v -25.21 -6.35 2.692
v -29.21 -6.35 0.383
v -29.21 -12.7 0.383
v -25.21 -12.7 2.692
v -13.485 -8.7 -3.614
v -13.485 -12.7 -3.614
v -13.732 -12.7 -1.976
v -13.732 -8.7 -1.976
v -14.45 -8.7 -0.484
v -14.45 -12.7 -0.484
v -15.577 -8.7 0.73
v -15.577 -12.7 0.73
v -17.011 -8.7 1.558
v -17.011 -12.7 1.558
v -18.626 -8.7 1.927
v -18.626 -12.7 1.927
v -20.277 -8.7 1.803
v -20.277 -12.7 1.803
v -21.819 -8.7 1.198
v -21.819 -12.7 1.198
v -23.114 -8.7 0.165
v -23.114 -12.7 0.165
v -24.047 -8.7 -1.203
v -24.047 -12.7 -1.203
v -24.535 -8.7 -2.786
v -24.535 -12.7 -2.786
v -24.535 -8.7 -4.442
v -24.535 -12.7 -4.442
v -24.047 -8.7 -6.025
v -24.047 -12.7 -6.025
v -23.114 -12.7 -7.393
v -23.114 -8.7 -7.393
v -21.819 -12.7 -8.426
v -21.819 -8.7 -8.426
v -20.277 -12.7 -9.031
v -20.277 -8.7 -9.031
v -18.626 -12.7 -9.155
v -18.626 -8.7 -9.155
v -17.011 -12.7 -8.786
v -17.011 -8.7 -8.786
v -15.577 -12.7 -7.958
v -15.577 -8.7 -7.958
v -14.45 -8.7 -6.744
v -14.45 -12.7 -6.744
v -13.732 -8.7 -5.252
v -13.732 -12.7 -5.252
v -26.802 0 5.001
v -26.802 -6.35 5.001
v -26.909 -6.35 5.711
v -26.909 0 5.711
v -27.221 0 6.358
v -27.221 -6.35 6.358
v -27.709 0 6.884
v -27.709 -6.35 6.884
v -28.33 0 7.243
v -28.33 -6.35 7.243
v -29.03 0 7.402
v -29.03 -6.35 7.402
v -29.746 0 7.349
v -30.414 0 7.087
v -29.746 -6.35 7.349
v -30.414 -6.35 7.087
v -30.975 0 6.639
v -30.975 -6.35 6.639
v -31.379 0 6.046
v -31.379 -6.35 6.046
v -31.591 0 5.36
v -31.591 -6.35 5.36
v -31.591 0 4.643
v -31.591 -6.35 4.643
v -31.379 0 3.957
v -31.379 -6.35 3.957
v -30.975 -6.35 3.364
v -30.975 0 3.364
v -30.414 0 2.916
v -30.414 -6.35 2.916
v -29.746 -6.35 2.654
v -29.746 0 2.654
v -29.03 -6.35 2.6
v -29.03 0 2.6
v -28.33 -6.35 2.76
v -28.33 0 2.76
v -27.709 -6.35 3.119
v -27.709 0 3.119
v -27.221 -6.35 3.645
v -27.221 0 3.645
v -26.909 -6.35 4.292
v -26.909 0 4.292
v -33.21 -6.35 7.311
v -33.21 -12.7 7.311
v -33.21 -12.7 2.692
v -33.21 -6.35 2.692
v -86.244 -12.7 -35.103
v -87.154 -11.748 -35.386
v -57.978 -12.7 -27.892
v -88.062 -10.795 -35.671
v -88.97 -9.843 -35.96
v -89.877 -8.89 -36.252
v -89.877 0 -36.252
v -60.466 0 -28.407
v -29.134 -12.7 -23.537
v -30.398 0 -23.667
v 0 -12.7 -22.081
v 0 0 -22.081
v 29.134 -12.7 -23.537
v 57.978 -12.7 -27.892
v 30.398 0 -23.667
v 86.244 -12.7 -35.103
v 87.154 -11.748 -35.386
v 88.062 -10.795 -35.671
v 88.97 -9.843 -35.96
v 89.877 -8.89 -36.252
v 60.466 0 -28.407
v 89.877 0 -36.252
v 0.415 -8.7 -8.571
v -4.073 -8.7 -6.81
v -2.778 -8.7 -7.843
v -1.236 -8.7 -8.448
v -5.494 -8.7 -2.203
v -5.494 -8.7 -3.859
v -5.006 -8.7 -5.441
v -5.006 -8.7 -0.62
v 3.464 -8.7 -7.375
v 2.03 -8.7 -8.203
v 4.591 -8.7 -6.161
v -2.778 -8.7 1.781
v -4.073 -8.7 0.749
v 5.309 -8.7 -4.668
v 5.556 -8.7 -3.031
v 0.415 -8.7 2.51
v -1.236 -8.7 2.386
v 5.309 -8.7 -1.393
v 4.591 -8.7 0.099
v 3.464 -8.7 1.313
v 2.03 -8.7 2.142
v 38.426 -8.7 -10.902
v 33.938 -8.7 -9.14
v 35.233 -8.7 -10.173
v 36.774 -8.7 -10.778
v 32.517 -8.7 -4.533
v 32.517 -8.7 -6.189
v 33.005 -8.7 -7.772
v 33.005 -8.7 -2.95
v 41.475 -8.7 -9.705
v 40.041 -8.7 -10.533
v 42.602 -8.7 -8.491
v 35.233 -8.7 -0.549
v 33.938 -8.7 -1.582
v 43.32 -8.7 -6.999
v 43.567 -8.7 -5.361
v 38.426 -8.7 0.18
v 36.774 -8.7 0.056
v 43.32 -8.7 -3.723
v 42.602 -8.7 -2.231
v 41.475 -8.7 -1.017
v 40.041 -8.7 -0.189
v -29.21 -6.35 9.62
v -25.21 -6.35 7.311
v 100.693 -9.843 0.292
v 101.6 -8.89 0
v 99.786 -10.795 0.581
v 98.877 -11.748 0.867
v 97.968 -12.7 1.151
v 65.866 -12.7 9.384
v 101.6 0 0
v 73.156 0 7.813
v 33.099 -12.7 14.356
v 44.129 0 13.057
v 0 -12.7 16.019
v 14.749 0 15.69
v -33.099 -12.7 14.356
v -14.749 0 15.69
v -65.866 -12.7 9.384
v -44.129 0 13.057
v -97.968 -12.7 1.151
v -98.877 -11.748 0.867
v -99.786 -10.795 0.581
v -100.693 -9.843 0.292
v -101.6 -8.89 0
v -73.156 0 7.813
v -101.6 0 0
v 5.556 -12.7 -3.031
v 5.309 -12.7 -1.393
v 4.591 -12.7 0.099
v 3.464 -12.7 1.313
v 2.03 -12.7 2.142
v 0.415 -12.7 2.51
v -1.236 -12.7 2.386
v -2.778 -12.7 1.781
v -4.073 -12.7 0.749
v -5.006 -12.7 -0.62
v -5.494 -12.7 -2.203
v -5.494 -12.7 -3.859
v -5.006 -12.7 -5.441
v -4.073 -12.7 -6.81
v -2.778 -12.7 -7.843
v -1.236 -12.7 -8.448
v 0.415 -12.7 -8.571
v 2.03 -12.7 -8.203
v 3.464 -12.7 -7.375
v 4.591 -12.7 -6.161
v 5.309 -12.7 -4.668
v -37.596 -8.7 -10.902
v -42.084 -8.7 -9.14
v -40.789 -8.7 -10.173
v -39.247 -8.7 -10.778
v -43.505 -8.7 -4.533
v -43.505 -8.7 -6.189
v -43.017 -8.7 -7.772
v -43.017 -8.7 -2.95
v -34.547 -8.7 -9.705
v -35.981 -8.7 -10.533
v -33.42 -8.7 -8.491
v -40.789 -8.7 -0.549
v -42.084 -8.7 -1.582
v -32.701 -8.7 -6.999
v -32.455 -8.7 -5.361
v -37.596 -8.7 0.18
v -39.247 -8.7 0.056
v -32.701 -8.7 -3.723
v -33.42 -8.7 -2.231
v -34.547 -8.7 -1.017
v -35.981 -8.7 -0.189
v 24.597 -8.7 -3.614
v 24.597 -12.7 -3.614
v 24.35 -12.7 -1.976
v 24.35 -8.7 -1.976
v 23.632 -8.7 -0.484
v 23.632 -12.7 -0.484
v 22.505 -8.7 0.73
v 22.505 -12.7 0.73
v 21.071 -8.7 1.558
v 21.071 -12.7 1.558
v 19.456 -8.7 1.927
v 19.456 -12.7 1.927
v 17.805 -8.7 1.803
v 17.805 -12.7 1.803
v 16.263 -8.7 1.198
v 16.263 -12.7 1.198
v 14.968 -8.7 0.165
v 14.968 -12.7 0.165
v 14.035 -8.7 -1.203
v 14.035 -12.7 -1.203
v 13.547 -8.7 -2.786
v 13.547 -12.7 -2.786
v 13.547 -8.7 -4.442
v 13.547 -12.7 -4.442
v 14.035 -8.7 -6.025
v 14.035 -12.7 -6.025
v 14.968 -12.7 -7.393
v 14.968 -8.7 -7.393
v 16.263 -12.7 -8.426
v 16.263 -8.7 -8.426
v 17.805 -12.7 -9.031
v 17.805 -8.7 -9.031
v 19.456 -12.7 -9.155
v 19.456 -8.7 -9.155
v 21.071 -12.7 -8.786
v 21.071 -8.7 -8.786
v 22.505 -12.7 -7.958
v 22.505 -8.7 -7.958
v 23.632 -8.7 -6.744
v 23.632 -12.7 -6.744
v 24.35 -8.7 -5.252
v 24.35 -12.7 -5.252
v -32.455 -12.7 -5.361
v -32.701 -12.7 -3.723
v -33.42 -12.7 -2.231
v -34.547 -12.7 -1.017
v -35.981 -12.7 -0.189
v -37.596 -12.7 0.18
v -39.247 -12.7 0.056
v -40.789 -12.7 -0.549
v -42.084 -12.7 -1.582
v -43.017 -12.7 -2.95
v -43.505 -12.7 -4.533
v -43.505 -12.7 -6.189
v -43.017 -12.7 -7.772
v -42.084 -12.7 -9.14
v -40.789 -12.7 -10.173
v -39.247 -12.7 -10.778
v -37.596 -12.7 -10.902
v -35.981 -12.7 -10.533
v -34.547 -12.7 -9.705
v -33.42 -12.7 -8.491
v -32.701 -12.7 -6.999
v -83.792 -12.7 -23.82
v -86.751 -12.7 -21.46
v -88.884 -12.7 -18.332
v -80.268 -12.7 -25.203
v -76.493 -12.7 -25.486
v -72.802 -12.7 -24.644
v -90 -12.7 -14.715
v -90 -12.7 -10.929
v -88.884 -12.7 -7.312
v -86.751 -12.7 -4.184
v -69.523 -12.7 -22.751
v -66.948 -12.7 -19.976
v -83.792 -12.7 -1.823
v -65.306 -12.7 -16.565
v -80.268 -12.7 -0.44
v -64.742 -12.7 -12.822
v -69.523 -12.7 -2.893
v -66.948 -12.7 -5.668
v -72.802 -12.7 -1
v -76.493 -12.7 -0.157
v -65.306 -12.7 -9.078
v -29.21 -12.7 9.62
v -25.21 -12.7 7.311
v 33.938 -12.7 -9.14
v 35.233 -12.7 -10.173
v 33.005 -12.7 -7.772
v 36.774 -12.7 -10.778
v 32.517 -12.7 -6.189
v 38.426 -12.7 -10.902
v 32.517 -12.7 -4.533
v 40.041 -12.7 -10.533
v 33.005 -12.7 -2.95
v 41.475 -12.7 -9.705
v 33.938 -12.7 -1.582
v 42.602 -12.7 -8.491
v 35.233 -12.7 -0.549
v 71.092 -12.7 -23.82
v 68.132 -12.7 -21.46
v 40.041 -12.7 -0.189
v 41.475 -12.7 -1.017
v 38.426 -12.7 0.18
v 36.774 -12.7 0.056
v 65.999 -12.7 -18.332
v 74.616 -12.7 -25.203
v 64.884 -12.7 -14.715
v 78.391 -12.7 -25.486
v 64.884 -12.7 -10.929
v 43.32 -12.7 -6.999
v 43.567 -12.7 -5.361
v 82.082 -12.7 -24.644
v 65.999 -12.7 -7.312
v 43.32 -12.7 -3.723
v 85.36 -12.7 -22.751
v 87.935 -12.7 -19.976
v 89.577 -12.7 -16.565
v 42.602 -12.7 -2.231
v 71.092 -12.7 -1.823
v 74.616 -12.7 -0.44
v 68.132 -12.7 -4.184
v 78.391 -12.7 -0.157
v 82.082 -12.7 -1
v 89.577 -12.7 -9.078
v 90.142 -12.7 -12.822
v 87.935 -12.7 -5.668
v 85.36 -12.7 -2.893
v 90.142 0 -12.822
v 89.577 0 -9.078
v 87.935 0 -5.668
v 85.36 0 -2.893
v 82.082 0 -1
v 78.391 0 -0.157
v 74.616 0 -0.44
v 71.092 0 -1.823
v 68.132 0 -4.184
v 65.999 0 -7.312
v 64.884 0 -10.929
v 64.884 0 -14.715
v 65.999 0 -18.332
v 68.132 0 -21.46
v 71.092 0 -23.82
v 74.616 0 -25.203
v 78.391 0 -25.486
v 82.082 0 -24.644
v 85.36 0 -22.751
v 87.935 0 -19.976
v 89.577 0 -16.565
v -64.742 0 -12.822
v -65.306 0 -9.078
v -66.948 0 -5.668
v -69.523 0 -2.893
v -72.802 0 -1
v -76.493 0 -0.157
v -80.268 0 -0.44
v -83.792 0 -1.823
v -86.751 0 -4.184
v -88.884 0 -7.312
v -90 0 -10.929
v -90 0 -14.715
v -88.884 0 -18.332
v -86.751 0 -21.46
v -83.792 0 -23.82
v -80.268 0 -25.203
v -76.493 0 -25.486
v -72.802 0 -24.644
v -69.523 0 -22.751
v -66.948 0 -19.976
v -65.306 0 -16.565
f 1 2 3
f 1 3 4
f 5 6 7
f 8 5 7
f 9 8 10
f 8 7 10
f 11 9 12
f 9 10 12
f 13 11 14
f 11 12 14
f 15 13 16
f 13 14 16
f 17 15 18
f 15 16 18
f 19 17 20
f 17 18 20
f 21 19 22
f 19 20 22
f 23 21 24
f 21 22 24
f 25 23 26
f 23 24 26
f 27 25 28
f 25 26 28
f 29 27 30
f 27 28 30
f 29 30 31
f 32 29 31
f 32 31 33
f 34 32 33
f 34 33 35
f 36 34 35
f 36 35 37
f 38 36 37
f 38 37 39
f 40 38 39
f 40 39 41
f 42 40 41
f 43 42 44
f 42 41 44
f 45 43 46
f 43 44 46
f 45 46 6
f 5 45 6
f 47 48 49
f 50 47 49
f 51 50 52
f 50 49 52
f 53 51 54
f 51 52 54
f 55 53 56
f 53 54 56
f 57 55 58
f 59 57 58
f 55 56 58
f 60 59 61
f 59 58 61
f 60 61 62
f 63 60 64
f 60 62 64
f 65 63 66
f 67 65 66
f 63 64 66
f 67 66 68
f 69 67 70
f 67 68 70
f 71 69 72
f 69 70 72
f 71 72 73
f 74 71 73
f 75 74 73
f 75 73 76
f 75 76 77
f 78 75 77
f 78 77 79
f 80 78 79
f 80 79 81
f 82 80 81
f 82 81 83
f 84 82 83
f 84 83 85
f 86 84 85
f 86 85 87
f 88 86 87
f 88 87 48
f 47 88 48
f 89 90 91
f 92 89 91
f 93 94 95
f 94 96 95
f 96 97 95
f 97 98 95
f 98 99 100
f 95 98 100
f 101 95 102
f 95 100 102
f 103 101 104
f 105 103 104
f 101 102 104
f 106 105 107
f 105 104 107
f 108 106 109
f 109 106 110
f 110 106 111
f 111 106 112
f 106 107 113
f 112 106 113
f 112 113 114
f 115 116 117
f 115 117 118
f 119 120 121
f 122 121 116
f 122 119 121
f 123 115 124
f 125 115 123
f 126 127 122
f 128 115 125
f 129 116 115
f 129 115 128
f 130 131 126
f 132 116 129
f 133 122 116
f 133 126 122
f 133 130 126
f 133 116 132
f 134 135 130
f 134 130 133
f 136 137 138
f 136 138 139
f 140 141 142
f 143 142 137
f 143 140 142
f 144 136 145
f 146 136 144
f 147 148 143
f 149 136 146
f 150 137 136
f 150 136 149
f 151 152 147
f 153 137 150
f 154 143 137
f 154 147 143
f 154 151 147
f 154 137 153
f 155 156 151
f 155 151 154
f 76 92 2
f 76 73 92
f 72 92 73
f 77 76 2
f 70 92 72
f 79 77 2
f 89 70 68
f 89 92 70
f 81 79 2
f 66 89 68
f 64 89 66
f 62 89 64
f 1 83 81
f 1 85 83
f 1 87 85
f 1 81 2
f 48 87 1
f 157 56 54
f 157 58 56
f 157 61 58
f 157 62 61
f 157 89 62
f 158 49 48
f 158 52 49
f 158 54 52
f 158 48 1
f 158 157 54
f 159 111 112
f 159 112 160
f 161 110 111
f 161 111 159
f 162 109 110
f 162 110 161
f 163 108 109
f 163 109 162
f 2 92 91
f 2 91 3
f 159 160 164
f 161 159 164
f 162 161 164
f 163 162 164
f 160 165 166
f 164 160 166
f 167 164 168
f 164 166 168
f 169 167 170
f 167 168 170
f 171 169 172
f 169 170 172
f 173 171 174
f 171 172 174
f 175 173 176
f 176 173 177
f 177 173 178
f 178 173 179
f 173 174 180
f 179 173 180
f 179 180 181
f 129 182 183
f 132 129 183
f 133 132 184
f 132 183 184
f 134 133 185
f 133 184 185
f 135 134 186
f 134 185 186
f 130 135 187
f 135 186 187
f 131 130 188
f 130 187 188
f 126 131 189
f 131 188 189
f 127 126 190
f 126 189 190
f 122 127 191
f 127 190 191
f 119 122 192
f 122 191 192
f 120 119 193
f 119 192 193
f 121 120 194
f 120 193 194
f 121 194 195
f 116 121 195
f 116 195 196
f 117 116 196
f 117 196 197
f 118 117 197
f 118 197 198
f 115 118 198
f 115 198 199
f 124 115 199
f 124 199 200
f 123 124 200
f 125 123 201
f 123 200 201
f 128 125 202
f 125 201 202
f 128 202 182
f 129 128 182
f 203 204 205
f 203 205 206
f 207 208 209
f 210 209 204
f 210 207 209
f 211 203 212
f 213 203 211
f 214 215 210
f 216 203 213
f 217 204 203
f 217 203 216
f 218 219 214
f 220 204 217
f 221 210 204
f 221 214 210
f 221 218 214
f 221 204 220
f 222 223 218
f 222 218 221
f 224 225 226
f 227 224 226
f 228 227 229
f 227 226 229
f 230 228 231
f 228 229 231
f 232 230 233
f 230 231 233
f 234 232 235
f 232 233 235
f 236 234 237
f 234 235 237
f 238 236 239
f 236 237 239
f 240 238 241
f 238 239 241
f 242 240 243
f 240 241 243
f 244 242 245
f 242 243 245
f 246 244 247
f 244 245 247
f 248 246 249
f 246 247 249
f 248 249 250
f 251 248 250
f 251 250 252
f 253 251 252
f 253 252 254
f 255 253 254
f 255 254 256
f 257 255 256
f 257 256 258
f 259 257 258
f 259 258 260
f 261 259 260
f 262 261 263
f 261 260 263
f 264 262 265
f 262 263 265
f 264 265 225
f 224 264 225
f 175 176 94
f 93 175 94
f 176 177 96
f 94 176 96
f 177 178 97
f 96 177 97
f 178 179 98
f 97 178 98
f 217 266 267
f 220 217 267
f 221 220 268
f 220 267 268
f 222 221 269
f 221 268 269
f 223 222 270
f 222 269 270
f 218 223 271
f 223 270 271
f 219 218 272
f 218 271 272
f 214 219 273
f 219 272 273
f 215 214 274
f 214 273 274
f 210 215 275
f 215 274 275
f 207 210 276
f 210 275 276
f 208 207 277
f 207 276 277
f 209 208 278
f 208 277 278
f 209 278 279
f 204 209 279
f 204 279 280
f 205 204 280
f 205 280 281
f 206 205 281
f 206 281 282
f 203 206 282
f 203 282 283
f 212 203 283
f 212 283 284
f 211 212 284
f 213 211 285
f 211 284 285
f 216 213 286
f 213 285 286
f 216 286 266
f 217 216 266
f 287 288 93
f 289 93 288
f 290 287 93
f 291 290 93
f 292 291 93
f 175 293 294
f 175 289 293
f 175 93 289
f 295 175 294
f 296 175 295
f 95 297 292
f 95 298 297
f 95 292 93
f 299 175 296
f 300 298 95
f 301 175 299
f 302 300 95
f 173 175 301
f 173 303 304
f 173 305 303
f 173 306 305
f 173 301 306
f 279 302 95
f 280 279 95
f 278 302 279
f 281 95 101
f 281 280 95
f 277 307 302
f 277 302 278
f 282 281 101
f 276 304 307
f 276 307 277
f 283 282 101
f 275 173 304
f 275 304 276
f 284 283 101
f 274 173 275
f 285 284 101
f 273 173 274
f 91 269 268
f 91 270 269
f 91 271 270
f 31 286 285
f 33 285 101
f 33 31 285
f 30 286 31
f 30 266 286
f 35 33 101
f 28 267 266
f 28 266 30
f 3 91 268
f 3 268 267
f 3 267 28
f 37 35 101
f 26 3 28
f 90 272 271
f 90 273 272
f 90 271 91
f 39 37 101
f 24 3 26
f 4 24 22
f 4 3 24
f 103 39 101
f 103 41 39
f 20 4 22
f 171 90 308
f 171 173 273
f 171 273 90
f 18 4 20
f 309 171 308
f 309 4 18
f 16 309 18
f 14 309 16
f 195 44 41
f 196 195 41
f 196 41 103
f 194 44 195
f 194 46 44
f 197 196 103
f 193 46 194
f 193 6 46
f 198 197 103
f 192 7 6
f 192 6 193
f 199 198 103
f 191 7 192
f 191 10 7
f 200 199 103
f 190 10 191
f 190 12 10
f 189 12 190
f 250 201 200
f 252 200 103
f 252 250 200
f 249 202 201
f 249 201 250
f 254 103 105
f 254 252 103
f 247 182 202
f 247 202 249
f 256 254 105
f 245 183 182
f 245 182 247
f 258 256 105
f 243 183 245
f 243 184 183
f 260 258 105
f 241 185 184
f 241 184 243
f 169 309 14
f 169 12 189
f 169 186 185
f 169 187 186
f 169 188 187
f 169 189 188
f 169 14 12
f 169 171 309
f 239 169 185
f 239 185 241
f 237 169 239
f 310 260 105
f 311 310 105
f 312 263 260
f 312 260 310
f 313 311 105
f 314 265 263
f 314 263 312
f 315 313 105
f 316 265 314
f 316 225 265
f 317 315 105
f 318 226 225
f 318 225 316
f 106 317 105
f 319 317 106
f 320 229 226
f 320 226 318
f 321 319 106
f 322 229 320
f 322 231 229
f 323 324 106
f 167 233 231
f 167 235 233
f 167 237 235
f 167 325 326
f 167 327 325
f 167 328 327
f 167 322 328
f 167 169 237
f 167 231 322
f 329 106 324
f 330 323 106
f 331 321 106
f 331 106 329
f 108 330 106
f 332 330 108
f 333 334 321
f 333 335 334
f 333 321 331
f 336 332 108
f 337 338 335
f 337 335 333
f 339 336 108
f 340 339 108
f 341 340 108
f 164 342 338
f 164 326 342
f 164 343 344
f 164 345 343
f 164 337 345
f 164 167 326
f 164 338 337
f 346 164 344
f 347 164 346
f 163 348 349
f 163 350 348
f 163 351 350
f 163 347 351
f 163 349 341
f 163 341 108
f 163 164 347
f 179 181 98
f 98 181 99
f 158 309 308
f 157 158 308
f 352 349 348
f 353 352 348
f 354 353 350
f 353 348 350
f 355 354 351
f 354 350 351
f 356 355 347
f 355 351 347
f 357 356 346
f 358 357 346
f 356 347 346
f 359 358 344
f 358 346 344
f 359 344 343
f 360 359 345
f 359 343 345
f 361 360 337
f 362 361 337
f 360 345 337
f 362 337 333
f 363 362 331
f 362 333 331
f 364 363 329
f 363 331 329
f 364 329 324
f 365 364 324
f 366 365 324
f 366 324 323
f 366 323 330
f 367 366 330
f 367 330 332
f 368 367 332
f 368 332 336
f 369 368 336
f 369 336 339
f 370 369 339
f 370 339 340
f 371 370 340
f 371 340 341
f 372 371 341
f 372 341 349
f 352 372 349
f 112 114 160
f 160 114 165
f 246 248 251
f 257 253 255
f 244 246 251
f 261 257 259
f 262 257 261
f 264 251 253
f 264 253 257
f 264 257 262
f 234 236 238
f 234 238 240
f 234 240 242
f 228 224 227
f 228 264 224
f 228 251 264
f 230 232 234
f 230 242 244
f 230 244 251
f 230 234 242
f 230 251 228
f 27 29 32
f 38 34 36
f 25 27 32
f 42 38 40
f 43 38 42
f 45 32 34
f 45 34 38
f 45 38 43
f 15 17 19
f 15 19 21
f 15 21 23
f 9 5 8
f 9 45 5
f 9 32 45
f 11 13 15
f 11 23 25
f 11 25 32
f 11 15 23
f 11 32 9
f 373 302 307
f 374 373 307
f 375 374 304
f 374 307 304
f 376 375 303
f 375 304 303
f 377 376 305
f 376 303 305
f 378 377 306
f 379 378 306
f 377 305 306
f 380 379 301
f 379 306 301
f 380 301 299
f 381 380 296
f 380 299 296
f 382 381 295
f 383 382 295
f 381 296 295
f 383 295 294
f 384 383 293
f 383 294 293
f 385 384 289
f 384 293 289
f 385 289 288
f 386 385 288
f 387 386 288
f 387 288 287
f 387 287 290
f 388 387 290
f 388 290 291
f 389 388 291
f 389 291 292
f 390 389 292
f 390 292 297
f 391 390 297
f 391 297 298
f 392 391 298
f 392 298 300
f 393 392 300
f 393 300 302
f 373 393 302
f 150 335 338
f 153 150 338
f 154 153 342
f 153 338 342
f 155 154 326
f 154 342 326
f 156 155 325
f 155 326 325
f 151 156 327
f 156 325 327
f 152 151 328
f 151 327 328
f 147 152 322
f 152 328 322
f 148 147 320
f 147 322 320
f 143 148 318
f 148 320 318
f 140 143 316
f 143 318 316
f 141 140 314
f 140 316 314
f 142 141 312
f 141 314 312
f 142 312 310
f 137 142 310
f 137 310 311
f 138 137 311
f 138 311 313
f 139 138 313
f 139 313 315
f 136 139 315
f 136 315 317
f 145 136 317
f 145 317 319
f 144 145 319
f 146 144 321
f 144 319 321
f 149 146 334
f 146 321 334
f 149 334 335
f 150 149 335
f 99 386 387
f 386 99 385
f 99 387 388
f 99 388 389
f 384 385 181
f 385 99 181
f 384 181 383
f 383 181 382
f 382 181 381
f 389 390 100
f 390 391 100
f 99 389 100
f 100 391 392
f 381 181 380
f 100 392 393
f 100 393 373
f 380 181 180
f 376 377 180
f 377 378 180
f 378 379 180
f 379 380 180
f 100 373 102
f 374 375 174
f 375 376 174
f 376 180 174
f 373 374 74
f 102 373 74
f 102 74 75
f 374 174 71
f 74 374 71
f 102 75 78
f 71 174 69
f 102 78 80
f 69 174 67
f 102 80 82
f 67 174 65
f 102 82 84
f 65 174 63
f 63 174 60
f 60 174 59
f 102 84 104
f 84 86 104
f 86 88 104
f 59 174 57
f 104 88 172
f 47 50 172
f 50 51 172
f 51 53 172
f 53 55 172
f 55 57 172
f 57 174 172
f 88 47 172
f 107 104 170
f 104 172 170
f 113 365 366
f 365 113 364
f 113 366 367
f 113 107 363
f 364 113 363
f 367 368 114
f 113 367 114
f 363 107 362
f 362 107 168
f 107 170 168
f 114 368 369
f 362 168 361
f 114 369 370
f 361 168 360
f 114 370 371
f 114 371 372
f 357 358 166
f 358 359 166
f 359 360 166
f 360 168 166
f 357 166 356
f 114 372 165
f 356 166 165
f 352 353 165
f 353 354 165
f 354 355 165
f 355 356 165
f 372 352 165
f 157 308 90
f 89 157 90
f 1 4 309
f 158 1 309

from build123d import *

# Parameters (mm, degrees)
F1_DEPTH  = 12.7
F2_R      = 5.55625
F3_DEPTH  = 4
F4_R      = 12.7
F5_DEPTH  = 12.701
F6_SIZE   = 3.81
F8_DEPTH  = 6.35
F9_R      = 2.407749
F10_DEPTH = 6.351


with BuildPart() as f1:
    # F0 (on Front) → F1 (new body)
    with BuildSketch(Plane.XZ):
        with BuildLine():
            Line((89.876923, -36.251613), (101.6, 0))
            ThreePointArc((101.6, 0), (0, 16.019351), (-101.6, 0))
            Line((-101.6, 0), (-89.876923, -36.251613))
            ThreePointArc((-89.876923, -36.251613), (0, -22.080649), (89.876923, -36.251613))
        make_face()
    extrude(amount=F1_DEPTH)

    # F2 (on face) → F3 (cut)
    with BuildSketch(Plane.XZ.offset(12.7)):
        with Locations((0, -3.030649)):
            Circle(F2_R)
        with Locations((19.041072, -3.613812)):
            Circle(F2_R)
        with Locations((38.01077, -5.361116)):
            Circle(F2_R)
        with Locations((-38.01077, -5.361116)):
            Circle(F2_R)
        with Locations((-19.041072, -3.613812)):
            Circle(F2_R)
    extrude(amount=-F3_DEPTH, mode=Mode.SUBTRACT)

    # F4 (on face) → F5 (cut, through all)
    with BuildSketch(Plane.XZ.offset(12.7)):
        with Locations((77.441715, -12.821887)):
            Circle(F4_R)
        with Locations((-77.441715, -12.821887)):
            Circle(F4_R)
    extrude(amount=-F5_DEPTH, mode=Mode.SUBTRACT)

    # F6
    f6_edges = [f1.edges().sort_by_distance(p)[0] for p in [
        (-95.738462, -12.7, -18.125807),
        (95.738462, -12.7, -18.125807),
    ]]
    chamfer(f6_edges, length=F6_SIZE)

    # F7 (on face) → F8 (cut)
    with BuildSketch(Plane.XZ.offset(12.7)):
        Polygon((-29.21, 0.382625), (-25.21, 2.692027), (-25.21, 7.310829), (-29.21, 9.62023), (-33.21, 7.310829), (-33.21, 2.692027), align=None)
    extrude(amount=-F8_DEPTH, mode=Mode.SUBTRACT)

    # F9 (on face) → F10 (cut, through all)
    with BuildSketch(Plane.XZ.offset(6.35)):
        with Locations((-29.21, 5.001428)):
            Circle(F9_R)
    extrude(amount=-F10_DEPTH, mode=Mode.SUBTRACT)


solid = f1.part
